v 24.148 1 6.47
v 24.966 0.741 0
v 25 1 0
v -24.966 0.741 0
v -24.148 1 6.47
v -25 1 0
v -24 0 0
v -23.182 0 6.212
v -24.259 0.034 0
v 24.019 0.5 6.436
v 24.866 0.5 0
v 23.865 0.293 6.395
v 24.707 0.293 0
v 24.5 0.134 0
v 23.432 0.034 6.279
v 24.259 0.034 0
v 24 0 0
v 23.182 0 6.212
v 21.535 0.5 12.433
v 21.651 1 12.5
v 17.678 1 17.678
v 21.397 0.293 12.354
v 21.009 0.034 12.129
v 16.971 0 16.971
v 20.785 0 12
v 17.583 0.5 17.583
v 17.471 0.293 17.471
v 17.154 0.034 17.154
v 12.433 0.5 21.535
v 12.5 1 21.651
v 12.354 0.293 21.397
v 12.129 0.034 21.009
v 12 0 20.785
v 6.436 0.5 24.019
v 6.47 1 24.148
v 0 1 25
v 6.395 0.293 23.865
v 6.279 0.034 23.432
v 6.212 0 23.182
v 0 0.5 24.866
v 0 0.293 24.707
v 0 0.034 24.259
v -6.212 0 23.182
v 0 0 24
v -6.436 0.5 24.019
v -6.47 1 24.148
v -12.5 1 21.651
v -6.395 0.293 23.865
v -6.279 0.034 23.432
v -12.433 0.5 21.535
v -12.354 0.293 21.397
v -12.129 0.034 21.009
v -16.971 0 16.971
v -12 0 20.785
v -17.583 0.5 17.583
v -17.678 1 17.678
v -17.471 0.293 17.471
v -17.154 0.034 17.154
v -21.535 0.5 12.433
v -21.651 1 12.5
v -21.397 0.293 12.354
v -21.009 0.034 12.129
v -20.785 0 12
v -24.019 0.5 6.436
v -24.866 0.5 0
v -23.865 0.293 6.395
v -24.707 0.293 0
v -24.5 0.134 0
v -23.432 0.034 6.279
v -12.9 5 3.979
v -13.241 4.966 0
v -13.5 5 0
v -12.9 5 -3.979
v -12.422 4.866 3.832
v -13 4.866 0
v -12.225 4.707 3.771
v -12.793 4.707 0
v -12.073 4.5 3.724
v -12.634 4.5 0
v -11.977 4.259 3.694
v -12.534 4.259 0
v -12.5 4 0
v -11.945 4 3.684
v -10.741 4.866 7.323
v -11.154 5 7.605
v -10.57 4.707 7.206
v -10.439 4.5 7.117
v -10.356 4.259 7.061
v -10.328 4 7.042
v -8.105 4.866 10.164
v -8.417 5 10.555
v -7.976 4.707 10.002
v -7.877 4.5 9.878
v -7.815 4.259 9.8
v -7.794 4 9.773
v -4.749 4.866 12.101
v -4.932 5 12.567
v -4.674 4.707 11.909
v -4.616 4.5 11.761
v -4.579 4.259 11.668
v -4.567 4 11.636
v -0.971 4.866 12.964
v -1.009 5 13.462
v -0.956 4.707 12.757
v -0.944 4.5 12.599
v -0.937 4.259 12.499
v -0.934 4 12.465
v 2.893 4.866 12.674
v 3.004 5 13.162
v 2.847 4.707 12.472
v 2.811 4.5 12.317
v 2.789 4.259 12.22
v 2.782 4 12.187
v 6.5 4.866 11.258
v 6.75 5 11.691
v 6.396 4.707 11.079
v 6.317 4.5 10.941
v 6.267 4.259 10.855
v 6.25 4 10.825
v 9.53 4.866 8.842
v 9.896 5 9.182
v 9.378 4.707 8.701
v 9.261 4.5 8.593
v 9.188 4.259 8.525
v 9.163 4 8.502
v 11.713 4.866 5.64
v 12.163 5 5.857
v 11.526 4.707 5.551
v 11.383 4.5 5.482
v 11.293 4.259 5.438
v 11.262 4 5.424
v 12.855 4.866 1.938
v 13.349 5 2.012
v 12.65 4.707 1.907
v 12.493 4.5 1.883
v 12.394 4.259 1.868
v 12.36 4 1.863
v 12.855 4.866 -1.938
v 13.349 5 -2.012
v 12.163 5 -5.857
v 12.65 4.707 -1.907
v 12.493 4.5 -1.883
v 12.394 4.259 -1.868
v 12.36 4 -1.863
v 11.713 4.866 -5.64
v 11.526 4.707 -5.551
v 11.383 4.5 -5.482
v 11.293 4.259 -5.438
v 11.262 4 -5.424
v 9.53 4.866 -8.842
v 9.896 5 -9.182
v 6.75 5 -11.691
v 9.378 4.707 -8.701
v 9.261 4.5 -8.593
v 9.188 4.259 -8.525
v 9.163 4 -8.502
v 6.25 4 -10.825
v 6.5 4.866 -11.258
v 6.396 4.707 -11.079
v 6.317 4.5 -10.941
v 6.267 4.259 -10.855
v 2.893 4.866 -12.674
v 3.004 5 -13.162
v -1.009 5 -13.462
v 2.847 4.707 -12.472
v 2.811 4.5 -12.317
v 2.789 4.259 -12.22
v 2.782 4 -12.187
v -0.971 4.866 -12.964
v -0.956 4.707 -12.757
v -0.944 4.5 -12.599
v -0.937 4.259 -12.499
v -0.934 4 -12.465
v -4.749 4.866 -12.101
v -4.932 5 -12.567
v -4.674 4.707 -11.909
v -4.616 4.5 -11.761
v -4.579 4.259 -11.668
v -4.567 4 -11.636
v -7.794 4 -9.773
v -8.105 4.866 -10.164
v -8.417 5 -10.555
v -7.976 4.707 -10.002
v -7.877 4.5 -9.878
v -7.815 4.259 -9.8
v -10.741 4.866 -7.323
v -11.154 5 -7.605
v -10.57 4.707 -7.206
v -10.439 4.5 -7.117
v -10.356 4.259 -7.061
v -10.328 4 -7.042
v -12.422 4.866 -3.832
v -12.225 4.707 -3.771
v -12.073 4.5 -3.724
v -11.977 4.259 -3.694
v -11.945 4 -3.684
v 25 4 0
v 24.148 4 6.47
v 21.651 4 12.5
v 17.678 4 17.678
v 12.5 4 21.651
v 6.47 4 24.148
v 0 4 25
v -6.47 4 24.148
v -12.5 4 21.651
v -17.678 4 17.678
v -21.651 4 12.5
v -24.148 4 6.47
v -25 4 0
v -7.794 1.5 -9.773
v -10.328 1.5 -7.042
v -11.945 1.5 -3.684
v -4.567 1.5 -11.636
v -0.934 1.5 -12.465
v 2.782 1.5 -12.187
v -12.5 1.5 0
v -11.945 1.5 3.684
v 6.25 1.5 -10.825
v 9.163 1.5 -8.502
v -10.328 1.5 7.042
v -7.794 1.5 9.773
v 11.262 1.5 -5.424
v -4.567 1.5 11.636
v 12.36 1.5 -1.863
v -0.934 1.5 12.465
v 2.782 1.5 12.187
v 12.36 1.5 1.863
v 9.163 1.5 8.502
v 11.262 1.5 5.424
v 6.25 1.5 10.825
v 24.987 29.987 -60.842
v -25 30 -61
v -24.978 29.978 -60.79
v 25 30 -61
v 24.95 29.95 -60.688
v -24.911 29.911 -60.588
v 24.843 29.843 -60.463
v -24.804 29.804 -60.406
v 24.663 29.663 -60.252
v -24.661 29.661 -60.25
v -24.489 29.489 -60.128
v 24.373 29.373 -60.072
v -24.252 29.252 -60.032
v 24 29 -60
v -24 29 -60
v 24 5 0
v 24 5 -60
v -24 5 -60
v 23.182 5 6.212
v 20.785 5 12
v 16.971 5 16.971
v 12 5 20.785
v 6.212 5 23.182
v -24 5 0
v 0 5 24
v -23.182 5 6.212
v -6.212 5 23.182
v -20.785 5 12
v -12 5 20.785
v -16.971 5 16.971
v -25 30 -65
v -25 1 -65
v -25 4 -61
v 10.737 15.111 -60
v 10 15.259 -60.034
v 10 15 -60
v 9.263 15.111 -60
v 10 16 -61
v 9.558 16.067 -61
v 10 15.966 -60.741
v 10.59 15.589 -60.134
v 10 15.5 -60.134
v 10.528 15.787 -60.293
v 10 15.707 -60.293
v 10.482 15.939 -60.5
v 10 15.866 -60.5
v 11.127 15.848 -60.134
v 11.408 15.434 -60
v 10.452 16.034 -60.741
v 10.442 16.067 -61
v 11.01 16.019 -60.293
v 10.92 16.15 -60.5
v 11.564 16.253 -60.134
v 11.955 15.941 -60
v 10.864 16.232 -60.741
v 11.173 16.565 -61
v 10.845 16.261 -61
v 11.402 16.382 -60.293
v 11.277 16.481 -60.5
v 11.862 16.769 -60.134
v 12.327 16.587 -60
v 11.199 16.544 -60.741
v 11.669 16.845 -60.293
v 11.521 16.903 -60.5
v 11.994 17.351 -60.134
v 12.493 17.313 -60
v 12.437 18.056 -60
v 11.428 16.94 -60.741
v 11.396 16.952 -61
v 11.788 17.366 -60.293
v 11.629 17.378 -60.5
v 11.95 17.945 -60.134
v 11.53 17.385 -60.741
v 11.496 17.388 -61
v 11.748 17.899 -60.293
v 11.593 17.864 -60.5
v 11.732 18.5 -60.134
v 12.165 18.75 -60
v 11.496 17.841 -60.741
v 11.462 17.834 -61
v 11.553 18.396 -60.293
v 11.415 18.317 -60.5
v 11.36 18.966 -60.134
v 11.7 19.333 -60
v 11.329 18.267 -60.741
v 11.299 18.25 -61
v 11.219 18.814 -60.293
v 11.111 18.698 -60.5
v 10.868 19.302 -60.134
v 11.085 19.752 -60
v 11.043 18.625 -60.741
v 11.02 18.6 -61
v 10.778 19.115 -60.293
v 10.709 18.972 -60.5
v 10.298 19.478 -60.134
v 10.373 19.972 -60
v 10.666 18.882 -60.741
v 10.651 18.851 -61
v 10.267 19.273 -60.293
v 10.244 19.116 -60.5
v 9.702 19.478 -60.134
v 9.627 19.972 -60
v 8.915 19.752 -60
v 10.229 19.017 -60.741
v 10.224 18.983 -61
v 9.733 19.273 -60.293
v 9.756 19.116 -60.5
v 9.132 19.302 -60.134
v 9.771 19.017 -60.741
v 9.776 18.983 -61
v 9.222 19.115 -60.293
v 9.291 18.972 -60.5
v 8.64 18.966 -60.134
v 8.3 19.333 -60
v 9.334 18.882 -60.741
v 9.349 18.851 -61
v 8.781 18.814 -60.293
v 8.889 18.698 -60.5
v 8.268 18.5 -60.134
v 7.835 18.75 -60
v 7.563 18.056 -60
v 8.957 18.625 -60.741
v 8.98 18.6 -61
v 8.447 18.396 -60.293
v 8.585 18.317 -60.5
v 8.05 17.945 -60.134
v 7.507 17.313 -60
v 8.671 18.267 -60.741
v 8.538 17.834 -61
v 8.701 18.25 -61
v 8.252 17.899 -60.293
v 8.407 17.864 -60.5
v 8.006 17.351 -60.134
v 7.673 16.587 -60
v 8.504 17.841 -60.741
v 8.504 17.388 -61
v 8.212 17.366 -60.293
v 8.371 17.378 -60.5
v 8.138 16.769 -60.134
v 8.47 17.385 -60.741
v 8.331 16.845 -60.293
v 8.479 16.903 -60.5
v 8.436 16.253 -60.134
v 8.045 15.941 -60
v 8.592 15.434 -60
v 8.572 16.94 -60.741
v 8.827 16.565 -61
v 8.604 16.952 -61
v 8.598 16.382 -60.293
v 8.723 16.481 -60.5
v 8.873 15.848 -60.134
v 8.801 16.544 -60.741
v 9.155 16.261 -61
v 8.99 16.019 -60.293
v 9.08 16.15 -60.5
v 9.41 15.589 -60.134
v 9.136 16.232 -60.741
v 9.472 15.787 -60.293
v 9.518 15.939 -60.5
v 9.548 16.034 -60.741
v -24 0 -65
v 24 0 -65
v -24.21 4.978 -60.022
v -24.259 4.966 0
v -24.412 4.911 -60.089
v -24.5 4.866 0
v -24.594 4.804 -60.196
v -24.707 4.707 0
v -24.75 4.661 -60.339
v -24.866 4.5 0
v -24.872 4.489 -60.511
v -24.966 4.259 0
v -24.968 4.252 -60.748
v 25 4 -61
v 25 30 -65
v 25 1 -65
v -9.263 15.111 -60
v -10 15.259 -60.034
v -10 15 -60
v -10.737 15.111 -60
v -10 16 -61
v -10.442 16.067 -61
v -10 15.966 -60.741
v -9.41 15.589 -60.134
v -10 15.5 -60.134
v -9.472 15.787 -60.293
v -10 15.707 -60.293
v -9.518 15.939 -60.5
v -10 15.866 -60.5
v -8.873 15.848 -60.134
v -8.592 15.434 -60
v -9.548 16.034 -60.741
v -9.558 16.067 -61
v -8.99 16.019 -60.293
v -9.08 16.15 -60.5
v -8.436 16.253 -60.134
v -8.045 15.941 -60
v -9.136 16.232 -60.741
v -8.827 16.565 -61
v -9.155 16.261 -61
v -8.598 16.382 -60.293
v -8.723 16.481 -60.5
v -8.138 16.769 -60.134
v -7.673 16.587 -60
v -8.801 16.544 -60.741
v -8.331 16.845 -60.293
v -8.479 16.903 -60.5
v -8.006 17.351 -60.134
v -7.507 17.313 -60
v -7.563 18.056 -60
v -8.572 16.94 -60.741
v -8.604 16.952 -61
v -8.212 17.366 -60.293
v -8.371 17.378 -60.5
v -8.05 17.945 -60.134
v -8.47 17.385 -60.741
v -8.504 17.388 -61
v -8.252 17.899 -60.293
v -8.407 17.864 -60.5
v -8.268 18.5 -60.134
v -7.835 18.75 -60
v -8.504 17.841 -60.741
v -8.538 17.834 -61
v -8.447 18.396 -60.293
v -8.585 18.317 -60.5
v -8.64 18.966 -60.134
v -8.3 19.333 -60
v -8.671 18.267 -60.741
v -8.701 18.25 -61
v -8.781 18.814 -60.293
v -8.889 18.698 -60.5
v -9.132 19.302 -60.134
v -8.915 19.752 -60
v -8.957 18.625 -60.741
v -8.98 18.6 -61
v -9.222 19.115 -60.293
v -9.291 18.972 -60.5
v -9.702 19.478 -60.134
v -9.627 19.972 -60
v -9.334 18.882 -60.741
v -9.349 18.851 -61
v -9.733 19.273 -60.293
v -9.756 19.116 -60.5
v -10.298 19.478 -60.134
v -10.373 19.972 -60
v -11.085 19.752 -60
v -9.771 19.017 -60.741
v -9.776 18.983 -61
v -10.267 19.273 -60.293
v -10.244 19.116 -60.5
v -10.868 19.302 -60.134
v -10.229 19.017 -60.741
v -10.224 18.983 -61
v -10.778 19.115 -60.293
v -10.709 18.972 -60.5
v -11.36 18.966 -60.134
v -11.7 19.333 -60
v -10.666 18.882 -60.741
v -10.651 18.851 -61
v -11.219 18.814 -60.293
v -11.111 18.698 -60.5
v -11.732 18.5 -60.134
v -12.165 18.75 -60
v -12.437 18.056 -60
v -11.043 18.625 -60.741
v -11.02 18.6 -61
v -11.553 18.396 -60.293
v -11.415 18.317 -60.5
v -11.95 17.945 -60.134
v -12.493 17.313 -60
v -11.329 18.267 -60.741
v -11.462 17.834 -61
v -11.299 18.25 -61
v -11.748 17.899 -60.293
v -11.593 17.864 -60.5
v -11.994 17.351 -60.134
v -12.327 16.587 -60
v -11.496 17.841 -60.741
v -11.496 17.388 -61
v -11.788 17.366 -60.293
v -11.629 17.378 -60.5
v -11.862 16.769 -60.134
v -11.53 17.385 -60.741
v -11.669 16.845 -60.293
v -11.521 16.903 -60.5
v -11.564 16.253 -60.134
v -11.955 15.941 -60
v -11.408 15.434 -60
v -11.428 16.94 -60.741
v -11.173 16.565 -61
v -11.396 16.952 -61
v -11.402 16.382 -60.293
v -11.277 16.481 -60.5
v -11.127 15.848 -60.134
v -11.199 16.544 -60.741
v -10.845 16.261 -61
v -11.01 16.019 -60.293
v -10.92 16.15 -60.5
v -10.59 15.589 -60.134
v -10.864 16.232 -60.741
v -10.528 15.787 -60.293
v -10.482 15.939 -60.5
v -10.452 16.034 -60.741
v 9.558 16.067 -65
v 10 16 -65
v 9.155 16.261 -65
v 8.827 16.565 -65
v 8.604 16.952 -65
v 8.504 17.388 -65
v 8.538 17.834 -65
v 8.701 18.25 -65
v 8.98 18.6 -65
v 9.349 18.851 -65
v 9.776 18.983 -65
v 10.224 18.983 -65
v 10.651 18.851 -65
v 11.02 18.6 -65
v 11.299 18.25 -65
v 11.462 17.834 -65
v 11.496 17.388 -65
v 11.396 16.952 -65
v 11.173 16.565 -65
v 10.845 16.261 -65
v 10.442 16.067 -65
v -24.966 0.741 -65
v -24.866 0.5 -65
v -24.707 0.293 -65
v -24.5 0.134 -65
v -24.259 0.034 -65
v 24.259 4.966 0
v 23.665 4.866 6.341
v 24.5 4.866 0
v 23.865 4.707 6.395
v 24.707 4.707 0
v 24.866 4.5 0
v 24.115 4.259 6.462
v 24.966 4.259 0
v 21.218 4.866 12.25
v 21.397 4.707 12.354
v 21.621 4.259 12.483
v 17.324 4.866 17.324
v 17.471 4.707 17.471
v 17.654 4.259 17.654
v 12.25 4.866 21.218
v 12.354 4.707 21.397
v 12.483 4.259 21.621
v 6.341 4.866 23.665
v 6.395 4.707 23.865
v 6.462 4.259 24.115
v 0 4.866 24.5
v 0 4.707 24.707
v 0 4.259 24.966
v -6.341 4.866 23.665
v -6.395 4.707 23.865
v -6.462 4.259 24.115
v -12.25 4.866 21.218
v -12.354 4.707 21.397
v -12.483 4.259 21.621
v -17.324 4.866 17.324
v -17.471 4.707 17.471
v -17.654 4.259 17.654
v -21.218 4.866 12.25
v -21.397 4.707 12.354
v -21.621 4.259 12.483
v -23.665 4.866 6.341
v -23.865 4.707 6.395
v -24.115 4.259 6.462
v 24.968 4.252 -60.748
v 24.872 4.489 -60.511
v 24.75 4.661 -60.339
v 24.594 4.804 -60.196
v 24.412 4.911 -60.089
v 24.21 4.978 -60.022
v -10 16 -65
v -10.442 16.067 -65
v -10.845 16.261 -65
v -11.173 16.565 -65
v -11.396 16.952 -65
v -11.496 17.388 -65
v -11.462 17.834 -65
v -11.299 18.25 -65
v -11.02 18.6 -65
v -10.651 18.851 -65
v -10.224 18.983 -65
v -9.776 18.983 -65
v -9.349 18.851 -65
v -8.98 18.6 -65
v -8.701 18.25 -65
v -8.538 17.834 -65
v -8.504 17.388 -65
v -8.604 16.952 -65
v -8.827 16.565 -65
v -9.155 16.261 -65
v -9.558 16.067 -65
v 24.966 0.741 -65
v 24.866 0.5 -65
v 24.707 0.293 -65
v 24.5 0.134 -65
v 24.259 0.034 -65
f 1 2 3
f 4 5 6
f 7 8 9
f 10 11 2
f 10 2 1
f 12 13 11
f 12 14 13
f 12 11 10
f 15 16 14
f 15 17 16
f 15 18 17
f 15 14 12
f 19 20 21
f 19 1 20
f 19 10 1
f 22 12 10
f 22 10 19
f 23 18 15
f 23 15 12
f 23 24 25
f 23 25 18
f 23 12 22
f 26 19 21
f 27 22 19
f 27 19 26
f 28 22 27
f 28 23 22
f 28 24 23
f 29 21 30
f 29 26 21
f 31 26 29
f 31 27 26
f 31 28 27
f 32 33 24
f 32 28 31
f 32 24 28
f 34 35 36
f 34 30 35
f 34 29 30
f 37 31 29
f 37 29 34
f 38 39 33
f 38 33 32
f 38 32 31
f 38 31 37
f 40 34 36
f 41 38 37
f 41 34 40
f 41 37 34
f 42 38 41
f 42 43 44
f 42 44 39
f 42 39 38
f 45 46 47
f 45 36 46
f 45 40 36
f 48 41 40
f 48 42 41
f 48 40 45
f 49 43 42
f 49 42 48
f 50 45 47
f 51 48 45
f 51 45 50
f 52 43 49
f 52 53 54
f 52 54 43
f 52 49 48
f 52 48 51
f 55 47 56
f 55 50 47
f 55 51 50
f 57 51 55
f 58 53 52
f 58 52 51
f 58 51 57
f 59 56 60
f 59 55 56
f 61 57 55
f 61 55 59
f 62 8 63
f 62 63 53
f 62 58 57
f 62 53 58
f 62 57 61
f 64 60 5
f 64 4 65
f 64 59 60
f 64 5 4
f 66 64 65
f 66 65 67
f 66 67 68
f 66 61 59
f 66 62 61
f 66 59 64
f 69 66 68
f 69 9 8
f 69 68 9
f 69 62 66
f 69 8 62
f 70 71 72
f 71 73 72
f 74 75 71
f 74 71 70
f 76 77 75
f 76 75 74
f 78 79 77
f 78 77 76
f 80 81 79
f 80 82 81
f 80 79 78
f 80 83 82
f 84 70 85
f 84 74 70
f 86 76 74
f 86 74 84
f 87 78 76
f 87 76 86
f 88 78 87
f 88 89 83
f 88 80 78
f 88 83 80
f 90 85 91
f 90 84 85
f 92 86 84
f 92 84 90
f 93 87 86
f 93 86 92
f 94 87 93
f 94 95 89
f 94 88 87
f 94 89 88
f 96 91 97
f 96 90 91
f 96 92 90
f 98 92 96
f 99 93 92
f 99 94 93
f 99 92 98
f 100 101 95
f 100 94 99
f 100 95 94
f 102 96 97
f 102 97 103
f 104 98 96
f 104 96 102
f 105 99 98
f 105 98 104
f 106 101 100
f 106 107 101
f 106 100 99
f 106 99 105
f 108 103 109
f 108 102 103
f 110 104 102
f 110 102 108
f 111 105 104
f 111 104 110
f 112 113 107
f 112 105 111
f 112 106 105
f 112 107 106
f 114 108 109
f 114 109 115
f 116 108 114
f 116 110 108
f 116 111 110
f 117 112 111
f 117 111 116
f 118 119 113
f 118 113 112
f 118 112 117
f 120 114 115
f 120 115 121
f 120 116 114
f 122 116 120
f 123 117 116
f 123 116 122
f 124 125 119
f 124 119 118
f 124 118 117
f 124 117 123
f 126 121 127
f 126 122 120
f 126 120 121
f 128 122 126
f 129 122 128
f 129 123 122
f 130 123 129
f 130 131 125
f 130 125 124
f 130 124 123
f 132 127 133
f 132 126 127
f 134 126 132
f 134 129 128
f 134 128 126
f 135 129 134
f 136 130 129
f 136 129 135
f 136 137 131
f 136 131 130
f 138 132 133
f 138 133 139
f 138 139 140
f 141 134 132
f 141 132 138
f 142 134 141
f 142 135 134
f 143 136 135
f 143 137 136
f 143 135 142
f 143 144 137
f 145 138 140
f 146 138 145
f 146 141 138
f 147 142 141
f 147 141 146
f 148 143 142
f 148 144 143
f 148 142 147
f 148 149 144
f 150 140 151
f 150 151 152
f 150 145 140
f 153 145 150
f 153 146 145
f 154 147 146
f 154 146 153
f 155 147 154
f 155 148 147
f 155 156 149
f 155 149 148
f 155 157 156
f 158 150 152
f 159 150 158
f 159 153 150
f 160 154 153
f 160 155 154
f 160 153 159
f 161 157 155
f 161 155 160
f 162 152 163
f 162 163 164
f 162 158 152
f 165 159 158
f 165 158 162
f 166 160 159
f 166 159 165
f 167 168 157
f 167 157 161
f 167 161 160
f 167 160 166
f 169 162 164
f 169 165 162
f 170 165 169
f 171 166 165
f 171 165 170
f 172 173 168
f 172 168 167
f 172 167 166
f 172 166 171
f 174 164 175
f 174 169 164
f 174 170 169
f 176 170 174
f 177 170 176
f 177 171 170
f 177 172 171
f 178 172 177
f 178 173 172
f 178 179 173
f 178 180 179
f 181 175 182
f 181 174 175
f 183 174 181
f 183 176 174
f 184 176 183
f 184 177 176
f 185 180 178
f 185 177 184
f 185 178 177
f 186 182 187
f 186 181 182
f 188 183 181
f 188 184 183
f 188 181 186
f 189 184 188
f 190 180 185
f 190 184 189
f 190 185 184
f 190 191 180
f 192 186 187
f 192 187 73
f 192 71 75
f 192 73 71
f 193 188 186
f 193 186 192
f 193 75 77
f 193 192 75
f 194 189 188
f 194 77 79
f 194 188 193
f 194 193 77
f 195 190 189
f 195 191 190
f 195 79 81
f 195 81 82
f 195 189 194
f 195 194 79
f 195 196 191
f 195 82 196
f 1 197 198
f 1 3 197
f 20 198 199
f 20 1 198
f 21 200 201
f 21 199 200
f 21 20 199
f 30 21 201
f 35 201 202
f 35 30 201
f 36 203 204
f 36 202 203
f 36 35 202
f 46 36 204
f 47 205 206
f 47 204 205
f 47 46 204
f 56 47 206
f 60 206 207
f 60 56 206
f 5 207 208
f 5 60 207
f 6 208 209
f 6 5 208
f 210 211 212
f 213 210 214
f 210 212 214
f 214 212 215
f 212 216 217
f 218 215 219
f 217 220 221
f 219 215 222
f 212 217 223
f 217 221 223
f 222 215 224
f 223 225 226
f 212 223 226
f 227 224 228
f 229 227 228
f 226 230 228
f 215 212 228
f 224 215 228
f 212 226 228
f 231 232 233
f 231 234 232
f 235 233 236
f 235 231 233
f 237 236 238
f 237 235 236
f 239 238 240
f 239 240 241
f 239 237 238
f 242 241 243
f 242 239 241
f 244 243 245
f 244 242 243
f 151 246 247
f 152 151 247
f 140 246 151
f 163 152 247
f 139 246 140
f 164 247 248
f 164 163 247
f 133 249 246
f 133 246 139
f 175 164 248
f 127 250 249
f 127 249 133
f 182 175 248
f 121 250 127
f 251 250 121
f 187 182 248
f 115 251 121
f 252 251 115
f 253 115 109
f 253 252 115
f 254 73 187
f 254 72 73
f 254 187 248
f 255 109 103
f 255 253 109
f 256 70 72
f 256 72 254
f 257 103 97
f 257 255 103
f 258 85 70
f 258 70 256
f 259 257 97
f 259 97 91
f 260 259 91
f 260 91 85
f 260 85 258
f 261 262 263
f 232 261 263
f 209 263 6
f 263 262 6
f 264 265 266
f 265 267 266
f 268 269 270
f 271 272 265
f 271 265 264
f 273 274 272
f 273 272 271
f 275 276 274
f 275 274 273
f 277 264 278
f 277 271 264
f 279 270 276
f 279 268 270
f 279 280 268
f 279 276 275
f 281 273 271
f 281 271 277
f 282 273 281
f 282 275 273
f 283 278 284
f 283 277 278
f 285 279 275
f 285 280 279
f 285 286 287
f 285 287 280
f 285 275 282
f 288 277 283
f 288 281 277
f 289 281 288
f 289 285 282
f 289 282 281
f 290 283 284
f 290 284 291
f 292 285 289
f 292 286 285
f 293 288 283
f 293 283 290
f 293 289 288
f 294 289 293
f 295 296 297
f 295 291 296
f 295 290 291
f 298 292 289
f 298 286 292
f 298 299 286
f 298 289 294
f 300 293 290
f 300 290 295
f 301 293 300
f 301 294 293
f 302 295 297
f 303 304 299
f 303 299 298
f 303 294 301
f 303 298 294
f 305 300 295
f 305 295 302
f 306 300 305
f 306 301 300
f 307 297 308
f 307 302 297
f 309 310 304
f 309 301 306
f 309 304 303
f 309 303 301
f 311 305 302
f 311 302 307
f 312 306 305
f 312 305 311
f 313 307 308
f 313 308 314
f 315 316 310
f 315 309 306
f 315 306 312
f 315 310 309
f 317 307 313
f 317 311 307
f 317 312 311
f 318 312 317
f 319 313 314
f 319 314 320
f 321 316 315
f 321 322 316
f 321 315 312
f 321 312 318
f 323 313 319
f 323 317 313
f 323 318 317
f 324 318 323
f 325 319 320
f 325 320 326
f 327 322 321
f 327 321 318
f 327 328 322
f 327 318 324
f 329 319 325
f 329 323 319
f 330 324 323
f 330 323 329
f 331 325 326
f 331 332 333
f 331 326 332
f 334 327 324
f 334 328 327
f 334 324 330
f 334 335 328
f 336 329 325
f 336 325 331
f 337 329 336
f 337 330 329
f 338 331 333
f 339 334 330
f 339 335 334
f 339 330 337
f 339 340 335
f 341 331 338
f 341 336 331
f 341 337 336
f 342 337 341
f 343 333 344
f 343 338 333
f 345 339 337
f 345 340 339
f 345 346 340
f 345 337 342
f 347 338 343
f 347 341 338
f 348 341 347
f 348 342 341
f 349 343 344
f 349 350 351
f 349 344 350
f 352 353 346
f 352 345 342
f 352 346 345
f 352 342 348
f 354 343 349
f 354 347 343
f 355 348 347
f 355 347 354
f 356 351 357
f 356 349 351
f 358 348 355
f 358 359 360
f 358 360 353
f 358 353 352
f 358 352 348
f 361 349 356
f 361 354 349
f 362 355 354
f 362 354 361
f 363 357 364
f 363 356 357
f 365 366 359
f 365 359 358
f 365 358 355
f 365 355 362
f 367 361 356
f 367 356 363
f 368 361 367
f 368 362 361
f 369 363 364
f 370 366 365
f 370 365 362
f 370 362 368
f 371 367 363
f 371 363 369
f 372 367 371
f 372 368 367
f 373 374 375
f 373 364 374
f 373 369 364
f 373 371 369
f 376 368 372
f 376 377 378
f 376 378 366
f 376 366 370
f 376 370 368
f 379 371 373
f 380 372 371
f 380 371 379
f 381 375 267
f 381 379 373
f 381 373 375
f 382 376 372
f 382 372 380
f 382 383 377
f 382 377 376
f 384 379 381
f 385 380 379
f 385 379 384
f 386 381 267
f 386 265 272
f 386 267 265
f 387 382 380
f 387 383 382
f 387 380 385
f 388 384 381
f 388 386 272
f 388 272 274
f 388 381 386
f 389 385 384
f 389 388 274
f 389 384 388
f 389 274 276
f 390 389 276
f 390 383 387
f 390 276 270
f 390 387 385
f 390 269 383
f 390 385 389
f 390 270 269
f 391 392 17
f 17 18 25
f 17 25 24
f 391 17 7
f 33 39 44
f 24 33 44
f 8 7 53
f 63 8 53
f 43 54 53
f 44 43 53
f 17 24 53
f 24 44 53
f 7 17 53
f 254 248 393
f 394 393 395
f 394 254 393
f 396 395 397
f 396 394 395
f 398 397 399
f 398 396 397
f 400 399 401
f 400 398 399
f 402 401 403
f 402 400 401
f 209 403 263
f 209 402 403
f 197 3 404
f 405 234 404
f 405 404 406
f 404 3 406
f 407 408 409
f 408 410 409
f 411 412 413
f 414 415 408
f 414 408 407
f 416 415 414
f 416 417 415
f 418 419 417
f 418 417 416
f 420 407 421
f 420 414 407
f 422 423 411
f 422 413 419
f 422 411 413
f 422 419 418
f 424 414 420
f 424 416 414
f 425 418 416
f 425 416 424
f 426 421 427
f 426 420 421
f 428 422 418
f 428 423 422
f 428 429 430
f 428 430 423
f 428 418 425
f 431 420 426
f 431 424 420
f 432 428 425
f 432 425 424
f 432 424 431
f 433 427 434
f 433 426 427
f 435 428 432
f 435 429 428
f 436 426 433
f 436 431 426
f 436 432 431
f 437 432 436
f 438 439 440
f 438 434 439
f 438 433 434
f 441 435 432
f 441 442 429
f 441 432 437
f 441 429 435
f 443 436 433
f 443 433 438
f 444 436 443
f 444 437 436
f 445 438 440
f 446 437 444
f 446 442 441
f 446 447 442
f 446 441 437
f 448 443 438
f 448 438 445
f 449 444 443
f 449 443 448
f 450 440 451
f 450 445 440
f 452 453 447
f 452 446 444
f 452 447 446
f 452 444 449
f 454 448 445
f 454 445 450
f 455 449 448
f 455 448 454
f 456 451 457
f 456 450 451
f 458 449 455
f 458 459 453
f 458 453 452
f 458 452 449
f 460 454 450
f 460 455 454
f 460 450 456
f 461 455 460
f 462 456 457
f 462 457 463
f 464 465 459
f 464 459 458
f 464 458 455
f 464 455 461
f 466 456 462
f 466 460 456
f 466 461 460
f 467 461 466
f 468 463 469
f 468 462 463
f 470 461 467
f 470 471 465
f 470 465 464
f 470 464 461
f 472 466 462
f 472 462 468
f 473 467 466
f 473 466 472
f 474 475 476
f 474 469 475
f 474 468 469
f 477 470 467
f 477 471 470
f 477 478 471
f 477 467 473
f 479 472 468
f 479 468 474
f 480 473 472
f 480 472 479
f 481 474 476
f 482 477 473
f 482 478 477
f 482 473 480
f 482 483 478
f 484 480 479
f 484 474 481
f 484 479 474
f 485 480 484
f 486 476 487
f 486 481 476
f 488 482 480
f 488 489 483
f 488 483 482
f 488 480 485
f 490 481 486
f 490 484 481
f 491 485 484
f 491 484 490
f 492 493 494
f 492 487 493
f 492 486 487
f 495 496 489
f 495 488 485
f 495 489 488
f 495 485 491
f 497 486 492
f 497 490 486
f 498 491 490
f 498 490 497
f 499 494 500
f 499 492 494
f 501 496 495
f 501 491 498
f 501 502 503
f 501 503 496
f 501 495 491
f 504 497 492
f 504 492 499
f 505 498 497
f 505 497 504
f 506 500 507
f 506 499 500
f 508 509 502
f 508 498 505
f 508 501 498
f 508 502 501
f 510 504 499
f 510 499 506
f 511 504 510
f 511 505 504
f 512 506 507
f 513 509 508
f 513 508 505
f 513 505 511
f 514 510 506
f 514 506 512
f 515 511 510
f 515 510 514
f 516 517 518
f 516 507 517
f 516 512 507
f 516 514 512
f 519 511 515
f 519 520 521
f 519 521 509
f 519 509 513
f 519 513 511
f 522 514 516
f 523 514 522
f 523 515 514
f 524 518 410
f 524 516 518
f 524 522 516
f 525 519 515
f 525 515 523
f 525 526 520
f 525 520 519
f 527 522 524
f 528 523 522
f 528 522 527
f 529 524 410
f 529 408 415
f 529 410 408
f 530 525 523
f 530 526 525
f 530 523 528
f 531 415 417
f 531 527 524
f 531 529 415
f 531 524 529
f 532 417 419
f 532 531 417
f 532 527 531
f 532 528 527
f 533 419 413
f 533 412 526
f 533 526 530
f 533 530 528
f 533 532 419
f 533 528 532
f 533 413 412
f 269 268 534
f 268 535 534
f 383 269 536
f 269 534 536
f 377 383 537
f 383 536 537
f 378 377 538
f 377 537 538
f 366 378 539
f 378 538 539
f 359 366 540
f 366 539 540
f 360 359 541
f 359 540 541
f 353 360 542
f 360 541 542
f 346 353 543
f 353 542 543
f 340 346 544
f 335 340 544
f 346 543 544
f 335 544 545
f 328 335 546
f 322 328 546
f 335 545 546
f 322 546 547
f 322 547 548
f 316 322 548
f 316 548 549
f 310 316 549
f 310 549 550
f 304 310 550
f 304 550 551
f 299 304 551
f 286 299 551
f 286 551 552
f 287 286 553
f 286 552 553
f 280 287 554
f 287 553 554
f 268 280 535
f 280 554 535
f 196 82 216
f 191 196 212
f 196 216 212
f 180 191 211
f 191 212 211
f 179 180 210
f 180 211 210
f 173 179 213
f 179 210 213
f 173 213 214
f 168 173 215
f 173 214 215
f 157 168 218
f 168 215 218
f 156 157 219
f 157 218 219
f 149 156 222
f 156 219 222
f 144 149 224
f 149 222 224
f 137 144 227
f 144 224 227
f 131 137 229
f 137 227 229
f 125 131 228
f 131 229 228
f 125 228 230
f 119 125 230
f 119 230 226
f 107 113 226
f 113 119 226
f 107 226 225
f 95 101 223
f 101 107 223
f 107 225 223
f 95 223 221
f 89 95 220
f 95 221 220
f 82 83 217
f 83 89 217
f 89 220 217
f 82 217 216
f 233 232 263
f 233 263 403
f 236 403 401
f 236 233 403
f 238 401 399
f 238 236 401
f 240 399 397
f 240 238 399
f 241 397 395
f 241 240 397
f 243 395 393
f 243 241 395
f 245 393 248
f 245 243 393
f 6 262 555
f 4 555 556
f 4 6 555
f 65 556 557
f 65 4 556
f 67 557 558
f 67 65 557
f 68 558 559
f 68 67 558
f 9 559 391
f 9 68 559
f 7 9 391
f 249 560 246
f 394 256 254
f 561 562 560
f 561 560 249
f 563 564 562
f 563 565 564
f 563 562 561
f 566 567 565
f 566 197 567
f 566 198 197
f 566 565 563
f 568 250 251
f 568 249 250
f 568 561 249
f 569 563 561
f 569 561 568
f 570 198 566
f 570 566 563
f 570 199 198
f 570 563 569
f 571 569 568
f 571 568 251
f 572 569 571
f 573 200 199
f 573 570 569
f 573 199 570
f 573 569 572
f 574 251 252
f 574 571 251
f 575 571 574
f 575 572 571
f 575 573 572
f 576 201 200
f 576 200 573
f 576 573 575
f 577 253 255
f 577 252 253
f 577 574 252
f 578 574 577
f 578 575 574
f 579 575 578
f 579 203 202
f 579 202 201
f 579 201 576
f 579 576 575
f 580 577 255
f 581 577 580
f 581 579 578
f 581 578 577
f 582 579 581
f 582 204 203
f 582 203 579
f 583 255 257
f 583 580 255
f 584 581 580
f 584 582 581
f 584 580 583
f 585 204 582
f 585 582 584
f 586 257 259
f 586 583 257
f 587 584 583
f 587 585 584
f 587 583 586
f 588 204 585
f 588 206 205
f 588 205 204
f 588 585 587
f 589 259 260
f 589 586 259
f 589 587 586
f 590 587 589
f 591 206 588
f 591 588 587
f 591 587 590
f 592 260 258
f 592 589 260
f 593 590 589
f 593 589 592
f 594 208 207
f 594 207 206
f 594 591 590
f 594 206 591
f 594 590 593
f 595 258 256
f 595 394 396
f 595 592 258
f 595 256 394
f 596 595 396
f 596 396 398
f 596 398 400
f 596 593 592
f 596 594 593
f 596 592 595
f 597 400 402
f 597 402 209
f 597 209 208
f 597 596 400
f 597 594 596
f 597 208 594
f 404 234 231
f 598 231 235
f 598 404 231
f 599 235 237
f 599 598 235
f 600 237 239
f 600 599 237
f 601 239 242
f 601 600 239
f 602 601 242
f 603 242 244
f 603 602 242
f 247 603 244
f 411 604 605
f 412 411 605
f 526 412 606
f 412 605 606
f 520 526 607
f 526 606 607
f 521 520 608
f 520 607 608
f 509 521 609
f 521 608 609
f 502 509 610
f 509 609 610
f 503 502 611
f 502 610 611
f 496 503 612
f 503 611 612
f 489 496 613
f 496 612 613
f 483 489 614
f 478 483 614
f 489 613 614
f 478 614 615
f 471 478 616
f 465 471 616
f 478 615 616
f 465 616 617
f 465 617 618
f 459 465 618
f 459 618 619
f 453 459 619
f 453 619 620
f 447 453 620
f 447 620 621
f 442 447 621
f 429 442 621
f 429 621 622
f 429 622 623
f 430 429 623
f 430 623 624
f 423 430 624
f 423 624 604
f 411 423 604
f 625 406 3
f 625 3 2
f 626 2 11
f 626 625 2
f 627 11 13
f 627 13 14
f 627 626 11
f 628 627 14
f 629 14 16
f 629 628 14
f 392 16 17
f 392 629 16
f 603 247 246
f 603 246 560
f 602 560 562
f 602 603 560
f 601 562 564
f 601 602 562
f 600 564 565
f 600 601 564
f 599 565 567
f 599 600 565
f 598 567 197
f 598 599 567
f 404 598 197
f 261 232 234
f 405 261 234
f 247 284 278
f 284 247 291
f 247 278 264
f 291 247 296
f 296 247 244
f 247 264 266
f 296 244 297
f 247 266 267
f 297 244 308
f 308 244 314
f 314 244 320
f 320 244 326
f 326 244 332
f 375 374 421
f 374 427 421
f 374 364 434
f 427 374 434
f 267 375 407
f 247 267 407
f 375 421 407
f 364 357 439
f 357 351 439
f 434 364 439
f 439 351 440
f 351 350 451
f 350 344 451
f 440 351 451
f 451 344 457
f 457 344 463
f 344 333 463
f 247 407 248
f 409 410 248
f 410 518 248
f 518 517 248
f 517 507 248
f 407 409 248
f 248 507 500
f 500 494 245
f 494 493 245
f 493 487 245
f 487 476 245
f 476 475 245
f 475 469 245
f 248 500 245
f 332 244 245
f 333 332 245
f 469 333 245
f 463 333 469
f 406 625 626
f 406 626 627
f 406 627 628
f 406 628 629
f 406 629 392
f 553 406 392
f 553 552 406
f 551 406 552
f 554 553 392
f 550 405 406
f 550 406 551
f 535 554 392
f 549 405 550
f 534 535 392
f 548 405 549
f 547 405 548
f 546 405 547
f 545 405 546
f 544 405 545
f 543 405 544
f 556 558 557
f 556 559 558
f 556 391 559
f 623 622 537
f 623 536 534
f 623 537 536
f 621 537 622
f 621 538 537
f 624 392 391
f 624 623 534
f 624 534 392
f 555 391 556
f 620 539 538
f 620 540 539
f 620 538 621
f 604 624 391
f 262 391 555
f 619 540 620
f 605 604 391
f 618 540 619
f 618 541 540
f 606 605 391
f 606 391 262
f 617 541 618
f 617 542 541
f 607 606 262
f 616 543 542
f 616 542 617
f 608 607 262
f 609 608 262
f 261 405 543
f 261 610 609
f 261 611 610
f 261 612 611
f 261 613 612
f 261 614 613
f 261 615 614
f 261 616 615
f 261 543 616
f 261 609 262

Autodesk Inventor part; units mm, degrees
ref_plane "YZ Plane" through (0, 0, 0) normal (1, 0, 0) x (0, 1, 0)
ref_plane "XZ Plane" through (0, 0, 0) normal (0, 1, 0) x (-1, 0, 0)
ref_plane "XY Plane" through (0, 0, 0) normal (0, 0, 1) x (1, 0, 0)
sketch "Sketch1" plane through (0, 0, 0) normal (0, 1, 0) x (-1, 0, 0)
  circle A0 centre (0, 0) radius 12.5
  arc A1 (25, 0) -> (-25, 0) centre (0, 0) ccw
  line L0 (-25, 0) -> (-25, -60)
  line L1 (-25, -60) -> (25, -60)
  line L2 (25, -60) -> (25, 0)
  dimension "d0" = 25
  dimension "d1" = 50
  dimension "d2" = 60
extrude "Extrusion1" add sketch "Sketch1" along normal blind 5
sketch "Sketch2" plane through (25, 0, -60) normal (0, 0, -1) x (-1, 0, 0)
  point P0 (25, 0)
sketch "Sketch3" plane through (25, 0, -60) normal (0, 0, -1) x (-1, 0, 0)
  line L0 (0, 0) -> (50, 0)
  line L1 (50, 0) -> (50, 30)
  line L2 (50, 30) -> (0, 30)
  line L3 (0, 30) -> (0, 0)
  point P0 (25, 0)
  dimension "d5" = 30
extrude "Extrusion2" add sketch "Sketch3" along normal blind 5
hole "Hole1" at (-10, 17.5, -60) direction (0, 0, -1) diameter 3 end through all
hole "Hole2" at (10, 17.5, -60) direction (0, 0, -1) diameter 3 end through all
fillet "Fillet1" radius 1 1 edges at (10, 19, -60)
fillet "Fillet2" radius 1 1 edges at (-10, 19, -60)
fillet "Fillet3" radius 1 2 edges at (12.5, 5, 0) (12.5, 0, 0)
fillet "Fillet4" radius 1 9 edges at (25, 5, -30) (-25, 5, -30) (0, 5, 25) (25, 17.5, -60) (-25, 17.5, -60) (0, 30, -60) (0, 0, 25) (-25, 0, -32.5) (25, 0, -32.5)
sketch "Sketch4" plane through (0, 0, 0) normal (0, -1, 0) x (1, 0, 0)
  circle A0 centre (0, 0) radius 17.7289
extrude "Extrusion3" add sketch "Sketch4" against normal blind 1.5
properties part number "Shop Towel Holder"
